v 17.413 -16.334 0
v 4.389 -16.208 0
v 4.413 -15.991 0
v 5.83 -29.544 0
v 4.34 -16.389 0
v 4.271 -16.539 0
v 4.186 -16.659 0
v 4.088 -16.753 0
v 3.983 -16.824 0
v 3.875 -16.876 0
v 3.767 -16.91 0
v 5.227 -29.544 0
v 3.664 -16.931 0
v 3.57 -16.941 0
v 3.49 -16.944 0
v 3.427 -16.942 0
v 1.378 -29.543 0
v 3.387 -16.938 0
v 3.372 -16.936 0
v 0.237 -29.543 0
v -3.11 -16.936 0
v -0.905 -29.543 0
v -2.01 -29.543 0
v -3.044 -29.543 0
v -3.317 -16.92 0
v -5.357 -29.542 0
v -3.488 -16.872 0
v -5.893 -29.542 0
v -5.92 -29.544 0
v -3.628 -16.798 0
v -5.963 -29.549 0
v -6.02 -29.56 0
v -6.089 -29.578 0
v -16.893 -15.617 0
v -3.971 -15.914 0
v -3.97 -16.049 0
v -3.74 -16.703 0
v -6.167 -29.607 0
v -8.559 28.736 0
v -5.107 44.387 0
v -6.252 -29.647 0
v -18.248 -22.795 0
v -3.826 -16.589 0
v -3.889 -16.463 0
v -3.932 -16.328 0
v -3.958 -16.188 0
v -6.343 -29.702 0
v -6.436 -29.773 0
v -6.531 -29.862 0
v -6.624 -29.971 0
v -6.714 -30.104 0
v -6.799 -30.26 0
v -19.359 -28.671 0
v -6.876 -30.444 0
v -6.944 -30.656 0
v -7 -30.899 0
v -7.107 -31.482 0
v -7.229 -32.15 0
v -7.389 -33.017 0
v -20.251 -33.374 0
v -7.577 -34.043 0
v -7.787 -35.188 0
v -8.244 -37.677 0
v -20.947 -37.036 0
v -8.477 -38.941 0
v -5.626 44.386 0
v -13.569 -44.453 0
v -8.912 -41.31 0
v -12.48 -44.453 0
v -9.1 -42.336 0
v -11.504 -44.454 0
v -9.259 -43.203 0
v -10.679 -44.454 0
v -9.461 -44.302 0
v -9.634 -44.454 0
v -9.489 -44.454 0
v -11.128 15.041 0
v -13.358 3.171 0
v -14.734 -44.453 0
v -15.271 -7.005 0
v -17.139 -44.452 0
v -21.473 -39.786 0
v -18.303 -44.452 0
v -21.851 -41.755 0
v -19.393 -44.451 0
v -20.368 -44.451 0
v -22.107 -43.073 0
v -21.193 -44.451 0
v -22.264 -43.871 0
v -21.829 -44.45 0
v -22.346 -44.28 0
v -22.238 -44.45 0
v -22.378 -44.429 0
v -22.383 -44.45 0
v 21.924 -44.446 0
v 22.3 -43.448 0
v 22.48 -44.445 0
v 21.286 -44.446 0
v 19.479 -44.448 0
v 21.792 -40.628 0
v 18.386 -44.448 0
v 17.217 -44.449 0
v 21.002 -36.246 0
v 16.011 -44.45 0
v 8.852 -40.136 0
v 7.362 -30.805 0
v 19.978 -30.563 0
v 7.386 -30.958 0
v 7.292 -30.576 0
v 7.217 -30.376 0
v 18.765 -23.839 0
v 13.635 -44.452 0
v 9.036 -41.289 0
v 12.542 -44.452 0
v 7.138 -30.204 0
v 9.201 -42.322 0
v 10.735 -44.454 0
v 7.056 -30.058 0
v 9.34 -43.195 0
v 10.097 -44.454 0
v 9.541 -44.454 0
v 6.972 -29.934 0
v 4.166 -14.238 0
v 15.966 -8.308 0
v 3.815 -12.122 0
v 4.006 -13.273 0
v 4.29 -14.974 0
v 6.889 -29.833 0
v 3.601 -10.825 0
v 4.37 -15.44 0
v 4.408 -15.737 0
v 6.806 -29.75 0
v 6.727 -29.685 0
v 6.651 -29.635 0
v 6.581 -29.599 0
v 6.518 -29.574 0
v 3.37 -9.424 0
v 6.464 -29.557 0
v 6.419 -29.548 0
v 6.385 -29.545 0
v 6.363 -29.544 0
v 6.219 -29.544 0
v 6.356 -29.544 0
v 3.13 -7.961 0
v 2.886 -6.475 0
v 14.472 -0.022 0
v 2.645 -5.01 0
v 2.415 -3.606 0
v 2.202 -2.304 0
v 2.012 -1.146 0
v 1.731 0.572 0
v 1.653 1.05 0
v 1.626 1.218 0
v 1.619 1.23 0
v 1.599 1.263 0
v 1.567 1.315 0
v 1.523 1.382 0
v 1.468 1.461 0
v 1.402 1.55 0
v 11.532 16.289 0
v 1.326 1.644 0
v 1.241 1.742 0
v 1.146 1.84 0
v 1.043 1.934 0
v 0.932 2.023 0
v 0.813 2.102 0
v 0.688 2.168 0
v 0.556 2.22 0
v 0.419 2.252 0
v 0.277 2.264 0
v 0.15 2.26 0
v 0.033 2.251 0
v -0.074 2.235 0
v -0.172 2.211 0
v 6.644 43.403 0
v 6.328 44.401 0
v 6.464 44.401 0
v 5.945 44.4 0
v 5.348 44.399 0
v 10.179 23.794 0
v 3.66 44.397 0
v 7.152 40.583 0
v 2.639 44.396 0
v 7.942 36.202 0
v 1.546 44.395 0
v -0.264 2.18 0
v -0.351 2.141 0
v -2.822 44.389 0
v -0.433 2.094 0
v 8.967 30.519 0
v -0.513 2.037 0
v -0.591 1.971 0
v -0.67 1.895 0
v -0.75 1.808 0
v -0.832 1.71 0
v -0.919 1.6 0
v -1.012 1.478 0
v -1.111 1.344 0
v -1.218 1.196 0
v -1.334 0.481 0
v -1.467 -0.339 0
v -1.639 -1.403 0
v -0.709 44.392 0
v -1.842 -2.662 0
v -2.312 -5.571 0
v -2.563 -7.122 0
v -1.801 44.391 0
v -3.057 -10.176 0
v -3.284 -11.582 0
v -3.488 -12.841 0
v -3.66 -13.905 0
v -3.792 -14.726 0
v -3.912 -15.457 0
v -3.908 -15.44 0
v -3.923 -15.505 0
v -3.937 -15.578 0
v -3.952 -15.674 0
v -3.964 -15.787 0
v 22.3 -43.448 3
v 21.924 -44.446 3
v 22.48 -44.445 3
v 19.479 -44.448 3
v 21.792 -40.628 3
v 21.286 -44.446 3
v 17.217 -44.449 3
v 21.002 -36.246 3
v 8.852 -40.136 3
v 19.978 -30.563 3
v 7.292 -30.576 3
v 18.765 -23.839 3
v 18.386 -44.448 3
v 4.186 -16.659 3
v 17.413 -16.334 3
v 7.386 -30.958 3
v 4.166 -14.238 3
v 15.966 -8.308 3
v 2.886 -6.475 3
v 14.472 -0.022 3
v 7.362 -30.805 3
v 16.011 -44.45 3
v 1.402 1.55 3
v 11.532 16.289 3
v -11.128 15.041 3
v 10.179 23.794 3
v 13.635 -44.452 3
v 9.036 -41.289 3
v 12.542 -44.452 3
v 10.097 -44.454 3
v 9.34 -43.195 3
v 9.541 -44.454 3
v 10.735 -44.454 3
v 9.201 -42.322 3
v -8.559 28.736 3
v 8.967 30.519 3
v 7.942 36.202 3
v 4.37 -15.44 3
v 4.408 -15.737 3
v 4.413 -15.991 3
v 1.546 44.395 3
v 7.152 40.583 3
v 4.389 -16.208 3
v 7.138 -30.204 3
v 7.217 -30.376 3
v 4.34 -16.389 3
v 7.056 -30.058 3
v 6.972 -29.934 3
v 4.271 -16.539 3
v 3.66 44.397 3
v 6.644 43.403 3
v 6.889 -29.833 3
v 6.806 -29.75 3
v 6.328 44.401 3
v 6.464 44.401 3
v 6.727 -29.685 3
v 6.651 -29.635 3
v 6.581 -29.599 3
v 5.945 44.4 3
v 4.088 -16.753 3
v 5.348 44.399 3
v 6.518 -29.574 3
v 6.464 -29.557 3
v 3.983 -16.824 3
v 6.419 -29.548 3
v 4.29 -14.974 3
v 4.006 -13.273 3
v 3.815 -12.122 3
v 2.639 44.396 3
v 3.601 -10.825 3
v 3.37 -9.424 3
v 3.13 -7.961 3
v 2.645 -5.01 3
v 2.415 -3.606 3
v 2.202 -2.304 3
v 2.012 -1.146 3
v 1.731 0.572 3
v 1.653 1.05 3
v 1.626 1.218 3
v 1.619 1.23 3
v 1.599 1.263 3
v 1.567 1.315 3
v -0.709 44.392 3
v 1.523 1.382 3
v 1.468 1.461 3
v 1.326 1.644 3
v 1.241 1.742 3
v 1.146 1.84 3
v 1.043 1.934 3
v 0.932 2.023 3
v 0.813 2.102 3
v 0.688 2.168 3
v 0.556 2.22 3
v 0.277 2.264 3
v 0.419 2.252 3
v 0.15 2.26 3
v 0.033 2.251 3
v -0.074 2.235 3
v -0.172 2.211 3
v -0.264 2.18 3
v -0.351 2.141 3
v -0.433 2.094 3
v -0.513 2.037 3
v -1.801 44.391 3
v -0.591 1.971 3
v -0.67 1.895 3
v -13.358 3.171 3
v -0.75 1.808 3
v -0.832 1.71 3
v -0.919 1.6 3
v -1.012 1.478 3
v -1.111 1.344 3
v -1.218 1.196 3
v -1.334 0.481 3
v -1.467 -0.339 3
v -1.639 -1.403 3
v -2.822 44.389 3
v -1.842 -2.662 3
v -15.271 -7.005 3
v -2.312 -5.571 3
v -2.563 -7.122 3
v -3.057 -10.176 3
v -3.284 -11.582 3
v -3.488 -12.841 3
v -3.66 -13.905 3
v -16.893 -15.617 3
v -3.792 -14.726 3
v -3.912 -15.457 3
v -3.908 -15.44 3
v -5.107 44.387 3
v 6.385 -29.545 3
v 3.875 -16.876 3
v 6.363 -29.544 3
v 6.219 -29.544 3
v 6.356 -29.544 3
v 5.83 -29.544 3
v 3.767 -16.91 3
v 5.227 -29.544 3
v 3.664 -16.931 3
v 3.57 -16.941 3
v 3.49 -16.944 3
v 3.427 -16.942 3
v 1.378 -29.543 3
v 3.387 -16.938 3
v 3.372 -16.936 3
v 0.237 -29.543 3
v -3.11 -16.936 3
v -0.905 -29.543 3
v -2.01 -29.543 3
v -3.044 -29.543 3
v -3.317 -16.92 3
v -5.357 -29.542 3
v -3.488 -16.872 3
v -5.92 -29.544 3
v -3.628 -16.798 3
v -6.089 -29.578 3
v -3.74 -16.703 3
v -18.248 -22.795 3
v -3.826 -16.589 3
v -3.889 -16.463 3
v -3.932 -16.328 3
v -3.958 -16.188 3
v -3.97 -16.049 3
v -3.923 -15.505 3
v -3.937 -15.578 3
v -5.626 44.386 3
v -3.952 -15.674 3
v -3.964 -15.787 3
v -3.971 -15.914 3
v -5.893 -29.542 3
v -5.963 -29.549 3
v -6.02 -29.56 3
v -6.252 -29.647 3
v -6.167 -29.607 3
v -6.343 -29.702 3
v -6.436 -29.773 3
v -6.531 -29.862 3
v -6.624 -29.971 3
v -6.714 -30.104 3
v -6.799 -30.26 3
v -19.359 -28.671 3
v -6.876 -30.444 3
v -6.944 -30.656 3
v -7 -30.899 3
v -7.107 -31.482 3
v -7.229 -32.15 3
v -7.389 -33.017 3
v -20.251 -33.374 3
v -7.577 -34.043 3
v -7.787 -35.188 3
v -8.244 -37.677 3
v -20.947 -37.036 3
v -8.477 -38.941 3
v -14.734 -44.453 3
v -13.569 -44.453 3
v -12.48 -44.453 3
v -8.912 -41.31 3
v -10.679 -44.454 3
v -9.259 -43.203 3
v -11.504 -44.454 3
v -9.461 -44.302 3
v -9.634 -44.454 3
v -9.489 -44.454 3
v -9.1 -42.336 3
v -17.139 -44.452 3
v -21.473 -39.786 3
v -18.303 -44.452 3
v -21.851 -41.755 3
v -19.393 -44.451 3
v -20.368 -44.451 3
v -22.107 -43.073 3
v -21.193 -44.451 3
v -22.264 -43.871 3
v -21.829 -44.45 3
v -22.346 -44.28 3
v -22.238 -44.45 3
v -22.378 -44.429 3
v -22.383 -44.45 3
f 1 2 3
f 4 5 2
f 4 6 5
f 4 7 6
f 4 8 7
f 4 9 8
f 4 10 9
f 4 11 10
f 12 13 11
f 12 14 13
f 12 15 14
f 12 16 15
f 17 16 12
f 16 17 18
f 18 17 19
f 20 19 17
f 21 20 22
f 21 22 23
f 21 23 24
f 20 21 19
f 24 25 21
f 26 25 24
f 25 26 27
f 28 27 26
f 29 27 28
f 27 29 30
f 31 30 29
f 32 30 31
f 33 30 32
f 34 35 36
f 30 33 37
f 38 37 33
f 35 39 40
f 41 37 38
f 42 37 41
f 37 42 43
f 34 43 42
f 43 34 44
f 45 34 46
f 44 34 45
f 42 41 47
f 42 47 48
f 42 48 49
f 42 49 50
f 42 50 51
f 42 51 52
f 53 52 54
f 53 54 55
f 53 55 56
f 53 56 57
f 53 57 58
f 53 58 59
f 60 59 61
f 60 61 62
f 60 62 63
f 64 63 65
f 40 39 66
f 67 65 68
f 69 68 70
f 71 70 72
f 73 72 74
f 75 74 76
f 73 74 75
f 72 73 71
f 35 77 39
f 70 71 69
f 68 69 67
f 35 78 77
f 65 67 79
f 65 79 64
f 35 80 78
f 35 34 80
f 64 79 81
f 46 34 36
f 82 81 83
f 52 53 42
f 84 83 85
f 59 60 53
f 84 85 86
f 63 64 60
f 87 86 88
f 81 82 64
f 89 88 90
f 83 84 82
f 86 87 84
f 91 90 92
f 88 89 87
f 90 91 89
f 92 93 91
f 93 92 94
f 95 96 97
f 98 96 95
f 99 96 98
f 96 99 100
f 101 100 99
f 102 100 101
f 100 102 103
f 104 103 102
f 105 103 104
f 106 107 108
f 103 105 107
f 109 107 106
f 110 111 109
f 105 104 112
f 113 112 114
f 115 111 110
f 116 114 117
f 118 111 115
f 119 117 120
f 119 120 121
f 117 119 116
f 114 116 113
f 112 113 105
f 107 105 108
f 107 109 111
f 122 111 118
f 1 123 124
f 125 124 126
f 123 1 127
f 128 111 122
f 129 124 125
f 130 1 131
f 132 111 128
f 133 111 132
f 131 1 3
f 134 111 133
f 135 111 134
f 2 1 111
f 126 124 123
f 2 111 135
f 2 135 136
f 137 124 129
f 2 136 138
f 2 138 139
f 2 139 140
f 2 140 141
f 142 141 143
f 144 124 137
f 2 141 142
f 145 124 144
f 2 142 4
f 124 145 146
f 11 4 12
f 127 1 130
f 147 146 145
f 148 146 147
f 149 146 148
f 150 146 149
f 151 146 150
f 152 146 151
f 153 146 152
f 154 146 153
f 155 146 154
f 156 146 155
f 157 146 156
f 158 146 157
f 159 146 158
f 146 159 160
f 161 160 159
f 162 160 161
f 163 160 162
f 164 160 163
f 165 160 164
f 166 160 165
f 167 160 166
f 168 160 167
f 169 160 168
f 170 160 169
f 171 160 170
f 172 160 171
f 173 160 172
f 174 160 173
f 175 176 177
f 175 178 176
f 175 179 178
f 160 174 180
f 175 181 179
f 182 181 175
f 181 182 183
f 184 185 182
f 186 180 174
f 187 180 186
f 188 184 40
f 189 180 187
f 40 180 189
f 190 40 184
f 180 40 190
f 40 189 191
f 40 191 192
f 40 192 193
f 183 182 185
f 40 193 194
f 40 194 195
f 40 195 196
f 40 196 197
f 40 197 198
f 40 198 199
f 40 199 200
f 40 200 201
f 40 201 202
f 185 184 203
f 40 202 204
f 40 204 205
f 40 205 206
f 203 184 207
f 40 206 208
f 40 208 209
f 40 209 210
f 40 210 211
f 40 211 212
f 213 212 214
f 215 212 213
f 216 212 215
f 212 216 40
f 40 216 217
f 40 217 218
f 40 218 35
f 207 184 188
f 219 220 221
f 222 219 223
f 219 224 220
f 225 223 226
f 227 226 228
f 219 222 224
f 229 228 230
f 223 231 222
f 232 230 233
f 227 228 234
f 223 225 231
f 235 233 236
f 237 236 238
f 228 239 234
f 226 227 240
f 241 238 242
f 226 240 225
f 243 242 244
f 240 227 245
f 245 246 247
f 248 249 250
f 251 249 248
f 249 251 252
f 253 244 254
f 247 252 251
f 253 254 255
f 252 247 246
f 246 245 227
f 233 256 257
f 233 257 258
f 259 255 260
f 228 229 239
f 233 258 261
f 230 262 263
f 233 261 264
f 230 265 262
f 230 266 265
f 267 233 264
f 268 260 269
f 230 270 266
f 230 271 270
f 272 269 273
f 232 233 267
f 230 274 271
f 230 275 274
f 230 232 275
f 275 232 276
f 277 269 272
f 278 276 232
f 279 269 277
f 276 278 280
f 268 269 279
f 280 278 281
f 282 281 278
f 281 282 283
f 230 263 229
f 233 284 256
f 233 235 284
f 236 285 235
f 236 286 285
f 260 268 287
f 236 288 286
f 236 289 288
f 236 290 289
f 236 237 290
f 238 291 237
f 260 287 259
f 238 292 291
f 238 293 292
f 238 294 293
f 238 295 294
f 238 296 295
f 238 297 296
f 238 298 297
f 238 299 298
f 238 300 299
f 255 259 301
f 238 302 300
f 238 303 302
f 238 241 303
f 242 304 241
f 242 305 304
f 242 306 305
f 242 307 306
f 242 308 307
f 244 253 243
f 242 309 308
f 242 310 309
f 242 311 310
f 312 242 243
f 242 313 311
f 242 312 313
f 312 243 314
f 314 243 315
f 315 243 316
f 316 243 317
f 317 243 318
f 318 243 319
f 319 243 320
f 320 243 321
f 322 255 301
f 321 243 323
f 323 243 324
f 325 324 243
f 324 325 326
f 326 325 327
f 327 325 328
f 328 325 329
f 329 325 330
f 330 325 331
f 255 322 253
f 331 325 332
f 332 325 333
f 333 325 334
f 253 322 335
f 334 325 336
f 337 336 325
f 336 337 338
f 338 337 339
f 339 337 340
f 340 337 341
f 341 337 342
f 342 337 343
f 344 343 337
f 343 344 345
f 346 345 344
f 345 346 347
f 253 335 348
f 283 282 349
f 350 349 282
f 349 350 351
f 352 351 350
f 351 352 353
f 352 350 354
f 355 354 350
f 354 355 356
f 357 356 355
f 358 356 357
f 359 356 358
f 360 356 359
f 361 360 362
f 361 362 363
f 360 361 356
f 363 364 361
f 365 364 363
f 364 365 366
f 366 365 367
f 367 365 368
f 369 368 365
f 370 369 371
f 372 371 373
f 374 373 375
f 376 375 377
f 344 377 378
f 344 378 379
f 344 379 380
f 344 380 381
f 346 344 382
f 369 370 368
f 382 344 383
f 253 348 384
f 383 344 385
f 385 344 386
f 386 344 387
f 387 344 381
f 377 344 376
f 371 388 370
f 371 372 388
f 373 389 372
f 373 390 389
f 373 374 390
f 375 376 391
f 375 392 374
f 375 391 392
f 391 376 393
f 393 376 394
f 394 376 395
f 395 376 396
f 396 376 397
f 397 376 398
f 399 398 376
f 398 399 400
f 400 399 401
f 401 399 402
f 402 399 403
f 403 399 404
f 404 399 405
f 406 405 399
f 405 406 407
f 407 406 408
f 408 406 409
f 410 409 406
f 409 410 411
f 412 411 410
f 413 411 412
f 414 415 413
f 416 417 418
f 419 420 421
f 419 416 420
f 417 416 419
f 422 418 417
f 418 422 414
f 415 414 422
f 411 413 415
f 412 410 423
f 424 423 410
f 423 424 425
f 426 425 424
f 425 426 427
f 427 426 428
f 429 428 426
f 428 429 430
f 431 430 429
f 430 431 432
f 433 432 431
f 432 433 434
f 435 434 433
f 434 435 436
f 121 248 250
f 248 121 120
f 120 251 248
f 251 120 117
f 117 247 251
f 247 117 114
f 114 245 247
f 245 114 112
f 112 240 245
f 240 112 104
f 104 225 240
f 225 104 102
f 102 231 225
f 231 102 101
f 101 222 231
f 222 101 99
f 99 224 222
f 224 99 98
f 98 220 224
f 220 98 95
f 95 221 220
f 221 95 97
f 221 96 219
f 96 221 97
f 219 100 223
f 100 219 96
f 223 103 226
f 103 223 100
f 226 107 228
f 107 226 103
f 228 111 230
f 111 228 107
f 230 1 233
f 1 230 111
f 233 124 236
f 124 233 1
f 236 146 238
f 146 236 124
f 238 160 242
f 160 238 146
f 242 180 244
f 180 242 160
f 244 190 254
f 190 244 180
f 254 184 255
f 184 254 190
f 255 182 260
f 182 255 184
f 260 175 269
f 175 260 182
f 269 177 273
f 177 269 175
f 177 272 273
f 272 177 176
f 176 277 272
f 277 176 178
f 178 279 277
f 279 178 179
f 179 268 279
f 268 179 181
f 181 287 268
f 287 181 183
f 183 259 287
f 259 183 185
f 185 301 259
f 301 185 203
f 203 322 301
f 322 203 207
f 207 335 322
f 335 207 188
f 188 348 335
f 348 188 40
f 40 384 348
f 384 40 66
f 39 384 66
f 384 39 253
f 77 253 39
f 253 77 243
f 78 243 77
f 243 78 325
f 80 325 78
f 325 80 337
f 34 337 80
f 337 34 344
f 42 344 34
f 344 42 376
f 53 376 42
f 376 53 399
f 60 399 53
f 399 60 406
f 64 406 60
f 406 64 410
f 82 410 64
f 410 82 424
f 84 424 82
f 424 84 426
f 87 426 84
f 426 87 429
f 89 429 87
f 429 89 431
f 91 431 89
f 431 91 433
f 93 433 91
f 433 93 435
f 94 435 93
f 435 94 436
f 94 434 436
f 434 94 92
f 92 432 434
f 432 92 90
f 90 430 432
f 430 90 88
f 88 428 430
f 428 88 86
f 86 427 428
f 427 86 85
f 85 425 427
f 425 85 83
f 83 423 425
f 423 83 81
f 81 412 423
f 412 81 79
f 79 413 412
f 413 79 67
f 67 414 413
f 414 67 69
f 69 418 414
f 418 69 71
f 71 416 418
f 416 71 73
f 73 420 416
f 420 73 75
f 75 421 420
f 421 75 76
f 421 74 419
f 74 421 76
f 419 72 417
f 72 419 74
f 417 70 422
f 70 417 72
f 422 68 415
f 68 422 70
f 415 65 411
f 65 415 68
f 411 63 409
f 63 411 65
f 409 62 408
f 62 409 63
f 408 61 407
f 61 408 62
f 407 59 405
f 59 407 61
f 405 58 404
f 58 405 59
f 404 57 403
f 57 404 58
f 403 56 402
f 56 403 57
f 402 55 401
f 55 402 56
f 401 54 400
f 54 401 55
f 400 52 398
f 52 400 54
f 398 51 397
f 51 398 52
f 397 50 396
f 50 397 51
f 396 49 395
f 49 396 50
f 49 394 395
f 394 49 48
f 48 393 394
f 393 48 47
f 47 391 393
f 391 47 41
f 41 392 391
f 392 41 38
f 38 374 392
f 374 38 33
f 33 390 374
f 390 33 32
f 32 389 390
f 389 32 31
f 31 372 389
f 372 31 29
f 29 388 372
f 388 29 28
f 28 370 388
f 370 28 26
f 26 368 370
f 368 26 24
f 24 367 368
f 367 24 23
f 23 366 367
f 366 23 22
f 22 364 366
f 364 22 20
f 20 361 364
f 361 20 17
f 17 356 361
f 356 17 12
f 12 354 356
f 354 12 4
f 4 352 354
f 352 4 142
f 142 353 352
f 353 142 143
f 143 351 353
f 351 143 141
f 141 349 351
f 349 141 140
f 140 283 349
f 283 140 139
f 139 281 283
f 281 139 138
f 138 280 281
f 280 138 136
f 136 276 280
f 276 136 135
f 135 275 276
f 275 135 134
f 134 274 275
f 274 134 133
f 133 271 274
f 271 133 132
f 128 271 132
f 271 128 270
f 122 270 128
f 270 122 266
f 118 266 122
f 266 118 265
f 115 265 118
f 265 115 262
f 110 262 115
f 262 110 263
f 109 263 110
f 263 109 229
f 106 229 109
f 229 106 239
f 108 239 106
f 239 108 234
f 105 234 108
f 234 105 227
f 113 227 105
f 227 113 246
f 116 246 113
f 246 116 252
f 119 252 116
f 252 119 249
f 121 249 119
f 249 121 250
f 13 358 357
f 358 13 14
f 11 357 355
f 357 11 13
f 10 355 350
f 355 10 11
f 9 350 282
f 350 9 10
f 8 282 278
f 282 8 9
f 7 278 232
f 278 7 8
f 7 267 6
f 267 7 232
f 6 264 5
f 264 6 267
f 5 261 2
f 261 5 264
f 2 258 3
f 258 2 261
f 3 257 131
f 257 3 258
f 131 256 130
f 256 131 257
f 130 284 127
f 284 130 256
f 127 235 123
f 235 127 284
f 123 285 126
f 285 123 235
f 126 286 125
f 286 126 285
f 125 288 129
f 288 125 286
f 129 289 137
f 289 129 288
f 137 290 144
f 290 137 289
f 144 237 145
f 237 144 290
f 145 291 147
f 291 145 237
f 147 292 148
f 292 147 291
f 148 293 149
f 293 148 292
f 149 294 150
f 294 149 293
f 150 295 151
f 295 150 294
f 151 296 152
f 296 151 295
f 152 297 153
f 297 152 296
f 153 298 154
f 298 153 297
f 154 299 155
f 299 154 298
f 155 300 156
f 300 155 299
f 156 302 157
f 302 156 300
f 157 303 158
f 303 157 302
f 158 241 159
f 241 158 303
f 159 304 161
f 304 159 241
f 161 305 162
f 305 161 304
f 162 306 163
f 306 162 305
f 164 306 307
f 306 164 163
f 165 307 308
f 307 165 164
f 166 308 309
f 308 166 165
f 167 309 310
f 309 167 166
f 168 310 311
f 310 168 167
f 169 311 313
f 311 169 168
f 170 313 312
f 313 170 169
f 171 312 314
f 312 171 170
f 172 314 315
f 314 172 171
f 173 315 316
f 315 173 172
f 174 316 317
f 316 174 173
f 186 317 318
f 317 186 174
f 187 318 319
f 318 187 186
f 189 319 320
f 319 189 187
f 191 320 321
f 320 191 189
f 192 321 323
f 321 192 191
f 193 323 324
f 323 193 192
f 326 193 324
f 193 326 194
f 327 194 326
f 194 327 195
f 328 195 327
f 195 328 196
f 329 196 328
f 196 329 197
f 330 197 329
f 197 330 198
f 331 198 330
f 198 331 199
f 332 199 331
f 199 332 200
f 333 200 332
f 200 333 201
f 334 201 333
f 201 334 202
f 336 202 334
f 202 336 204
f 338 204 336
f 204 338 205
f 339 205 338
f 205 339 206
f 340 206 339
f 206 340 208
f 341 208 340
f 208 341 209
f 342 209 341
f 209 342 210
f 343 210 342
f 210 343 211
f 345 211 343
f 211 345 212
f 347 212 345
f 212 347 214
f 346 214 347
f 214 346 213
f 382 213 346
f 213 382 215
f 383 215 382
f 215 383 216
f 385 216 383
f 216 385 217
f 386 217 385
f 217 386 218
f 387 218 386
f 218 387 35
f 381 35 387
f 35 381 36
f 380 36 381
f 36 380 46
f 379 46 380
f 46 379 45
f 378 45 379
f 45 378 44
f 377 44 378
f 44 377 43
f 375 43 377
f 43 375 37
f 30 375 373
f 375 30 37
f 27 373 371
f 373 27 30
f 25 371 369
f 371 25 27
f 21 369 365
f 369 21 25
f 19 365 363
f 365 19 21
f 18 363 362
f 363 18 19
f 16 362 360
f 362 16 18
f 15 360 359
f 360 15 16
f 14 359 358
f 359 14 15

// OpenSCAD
// Generated from 交通部公路局（原交通部公路總局）「新式號牌使用之英文字、數字字體」author trace
fudge = 0.1;

module glyph_2012_A(h = 3) {
  difference() {
    linear_extrude(height = h)
      polygon(points = [[-5.6265, 44.3861], [-8.5595, 28.736], [-11.1285, 15.0411], [-13.3578, 3.171], [-15.2713, -7.0048], [-16.8933, -15.6168], [-18.2478, -22.7955], [-19.3589, -28.6712], [-20.2507, -33.3745], [-20.9473, -37.0359], [-21.4729, -39.7858], [-21.8514, -41.7547], [-22.1071, -43.073], [-22.264, -43.8713], [-22.3463, -44.2799], [-22.3779, -44.4294], [-22.3831, -44.4503], [-22.2383, -44.4503], [-21.8291, -44.4505], [-21.1932, -44.4507], [-20.3685, -44.4509], [-19.3926, -44.4512], [-18.3034, -44.4516], [-17.1386, -44.4519], [-15.9361, -44.4523], [-14.7336, -44.4527], [-13.5689, -44.453], [-12.4797, -44.4534], [-11.5038, -44.4537], [-10.679, -44.4539], [-10.0431, -44.4541], [-9.6339, -44.4542], [-9.4891, -44.4543], [-9.4611, -44.3021], [-9.3821, -43.8718], [-9.2594, -43.2034], [-9.1001, -42.3363], [-8.9118, -41.3104], [-8.7015, -40.1654], [-8.4766, -38.9409], [-8.2445, -37.6768], [-8.0123, -36.4126], [-7.7874, -35.1881], [-7.5772, -34.0431], [-7.3888, -33.0172], [-7.2295, -32.1502], [-7.1068, -31.4817], [-7.0278, -31.0515], [-6.9998, -30.8992], [-6.944, -30.656], [-6.8764, -30.4437], [-6.7992, -30.2603], [-6.7145, -30.1036], [-6.6244, -29.9715], [-6.531, -29.8619], [-6.4365, -29.7728], [-6.3429, -29.702], [-6.2524, -29.6474], [-6.1671, -29.6069], [-6.0891, -29.5784], [-6.0205, -29.5598], [-5.9635, -29.549], [-5.9202, -29.5439], [-5.8926, -29.5424], [-5.883, -29.5424], [-5.7455, -29.5424], [-5.3571, -29.5424], [-4.7535, -29.5425], [-3.9706, -29.5426], [-3.0443, -29.5427], [-2.0104, -29.5428], [-0.9049, -29.543], [0.2366, -29.5431], [1.378, -29.5433], [2.4836, -29.5434], [3.5175, -29.5435], [4.4438, -29.5436], [5.2266, -29.5437], [5.8302, -29.5438], [6.2187, -29.5439], [6.3561, -29.5439], [6.3635, -29.5437], [6.3849, -29.5446], [6.4187, -29.5485], [6.4637, -29.5575], [6.5183, -29.5736], [6.5813, -29.5989], [6.6513, -29.6355], [6.7267, -29.6852], [6.8063, -29.7503], [6.8886, -29.8327], [6.9723, -29.9345], [7.0559, -30.0576], [7.138, -30.2043], [7.2173, -30.3764], [7.2924, -30.576], [7.3618, -30.8051], [7.3862, -30.9584], [7.4554, -31.3916], [7.5629, -32.0648], [7.7023, -32.9378], [7.8673, -33.9709], [8.0514, -35.1238], [8.2483, -36.3568], [8.4516, -37.6298], [8.6549, -38.9027], [8.8518, -40.1357], [9.0359, -41.2887], [9.2009, -42.3217], [9.3403, -43.1948], [9.4478, -43.8679], [9.517, -44.3011], [9.5415, -44.4544], [9.6868, -44.4543], [10.0974, -44.454], [10.7355, -44.4536], [11.5631, -44.453], [12.5424, -44.4523], [13.6354, -44.4516], [14.8041, -44.4508], [16.0108, -44.45], [17.2175, -44.4491], [18.3863, -44.4483], [19.4793, -44.4476], [20.4585, -44.4469], [21.2861, -44.4463], [21.9242, -44.4459], [22.3349, -44.4456], [22.4802, -44.4455], [22.3003, -43.4477], [21.792, -40.6279], [21.0021, -36.2463], [19.9777, -30.5633], [18.7655, -23.8391], [17.4126, -16.334], [15.9658, -8.3083], [14.4722, -0.0223], [12.9785, 8.2637], [11.5317, 16.2893], [10.1788, 23.7944], [8.9666, 30.5186], [7.9422, 36.2017], [7.1523, 40.5833], [6.644, 43.4031], [6.4641, 44.4009], [6.3283, 44.4007], [5.9446, 44.4003], [5.3483, 44.3995], [4.575, 44.3986], [3.6599, 44.3975], [2.6386, 44.3962], [1.5464, 44.3949], [0.4188, 44.3935], [-0.7088, 44.3921], [-1.801, 44.3908], [-2.8223, 44.3895], [-3.7374, 44.3884], [-4.5107, 44.3875], [-5.107, 44.3868], [-5.4907, 44.3863]]);
    translate([0, 0, -fudge])
      linear_extrude(height = h + 2 * fudge)
        polygon(points = [[0.2772, 2.2637], [0.4194, 2.2525], [0.5565, 2.2197], [0.688, 2.1684], [0.8132, 2.1017], [0.9316, 2.0226], [1.0427, 1.9343], [1.1459, 1.8398], [1.2406, 1.7422], [1.3263, 1.6445], [1.4024, 1.5499], [1.4683, 1.4613], [1.5235, 1.382], [1.5674, 1.315], [1.5994, 1.2633], [1.6191, 1.23], [1.6258, 1.2182], [1.6533, 1.0498], [1.7314, 0.572], [1.8534, -0.1738], [2.0125, -1.1463], [2.202, -2.304], [2.4152, -3.6056], [2.6453, -5.0099], [2.8857, -6.4753], [3.1296, -7.9606], [3.3702, -9.4245], [3.6009, -10.8255], [3.815, -12.1223], [4.0056, -13.2735], [4.1662, -14.2379], [4.2899, -14.974], [4.37, -15.4405], [4.4081, -15.7367], [4.413, -15.9915], [4.389, -16.2081], [4.3403, -16.3895], [4.2712, -16.5387], [4.1858, -16.6589], [4.0885, -16.7531], [3.9834, -16.8243], [3.8748, -16.8757], [3.7669, -16.9102], [3.664, -16.931], [3.5703, -16.9412], [3.4901, -16.9438], [3.4275, -16.9418], [3.3868, -16.9384], [3.3724, -16.9365], [3.2995, -16.9365], [3.0938, -16.9365], [2.7741, -16.9365], [2.3594, -16.9365], [1.8688, -16.9365], [1.3212, -16.9365], [0.7356, -16.9365], [0.131, -16.9365], [-0.4736, -16.9365], [-1.0592, -16.9365], [-1.6068, -16.9365], [-2.0975, -16.9365], [-2.5121, -16.9365], [-2.8318, -16.9365], [-3.0376, -16.9365], [-3.1104, -16.9365], [-3.3166, -16.9197], [-3.4883, -16.8723], [-3.6284, -16.7985], [-3.7399, -16.7028], [-3.8257, -16.5895], [-3.8887, -16.4632], [-3.9318, -16.328], [-3.958, -16.1885], [-3.9702, -16.049], [-3.9712, -15.9138], [-3.9641, -15.7875], [-3.9517, -15.6742], [-3.937, -15.5785], [-3.9229, -15.5047], [-3.9122, -15.4573], [-3.908, -15.4405], [-3.8778, -15.2536], [-3.7925, -14.7256], [-3.6598, -13.9052], [-3.4878, -12.841], [-3.2842, -11.5819], [-3.057, -10.1765], [-2.8141, -8.6737], [-2.5633, -7.1221], [-2.3124, -5.5706], [-2.0695, -4.0678], [-1.8423, -2.6624], [-1.6387, -1.4033], [-1.4667, -0.3391], [-1.334, 0.4813], [-1.2487, 1.0093], [-1.2185, 1.1962], [-1.1109, 1.3437], [-1.0116, 1.4781], [-0.9192, 1.6], [-0.8323, 1.7097], [-0.7497, 1.8078], [-0.6698, 1.8947], [-0.5914, 1.9711], [-0.513, 2.0374], [-0.4332, 2.094], [-0.3508, 2.1415], [-0.2643, 2.1805], [-0.1724, 2.2113], [-0.0737, 2.2346], [0.0333, 2.2507], [0.1498, 2.2602]]);
  }
}

glyph_2012_A();
